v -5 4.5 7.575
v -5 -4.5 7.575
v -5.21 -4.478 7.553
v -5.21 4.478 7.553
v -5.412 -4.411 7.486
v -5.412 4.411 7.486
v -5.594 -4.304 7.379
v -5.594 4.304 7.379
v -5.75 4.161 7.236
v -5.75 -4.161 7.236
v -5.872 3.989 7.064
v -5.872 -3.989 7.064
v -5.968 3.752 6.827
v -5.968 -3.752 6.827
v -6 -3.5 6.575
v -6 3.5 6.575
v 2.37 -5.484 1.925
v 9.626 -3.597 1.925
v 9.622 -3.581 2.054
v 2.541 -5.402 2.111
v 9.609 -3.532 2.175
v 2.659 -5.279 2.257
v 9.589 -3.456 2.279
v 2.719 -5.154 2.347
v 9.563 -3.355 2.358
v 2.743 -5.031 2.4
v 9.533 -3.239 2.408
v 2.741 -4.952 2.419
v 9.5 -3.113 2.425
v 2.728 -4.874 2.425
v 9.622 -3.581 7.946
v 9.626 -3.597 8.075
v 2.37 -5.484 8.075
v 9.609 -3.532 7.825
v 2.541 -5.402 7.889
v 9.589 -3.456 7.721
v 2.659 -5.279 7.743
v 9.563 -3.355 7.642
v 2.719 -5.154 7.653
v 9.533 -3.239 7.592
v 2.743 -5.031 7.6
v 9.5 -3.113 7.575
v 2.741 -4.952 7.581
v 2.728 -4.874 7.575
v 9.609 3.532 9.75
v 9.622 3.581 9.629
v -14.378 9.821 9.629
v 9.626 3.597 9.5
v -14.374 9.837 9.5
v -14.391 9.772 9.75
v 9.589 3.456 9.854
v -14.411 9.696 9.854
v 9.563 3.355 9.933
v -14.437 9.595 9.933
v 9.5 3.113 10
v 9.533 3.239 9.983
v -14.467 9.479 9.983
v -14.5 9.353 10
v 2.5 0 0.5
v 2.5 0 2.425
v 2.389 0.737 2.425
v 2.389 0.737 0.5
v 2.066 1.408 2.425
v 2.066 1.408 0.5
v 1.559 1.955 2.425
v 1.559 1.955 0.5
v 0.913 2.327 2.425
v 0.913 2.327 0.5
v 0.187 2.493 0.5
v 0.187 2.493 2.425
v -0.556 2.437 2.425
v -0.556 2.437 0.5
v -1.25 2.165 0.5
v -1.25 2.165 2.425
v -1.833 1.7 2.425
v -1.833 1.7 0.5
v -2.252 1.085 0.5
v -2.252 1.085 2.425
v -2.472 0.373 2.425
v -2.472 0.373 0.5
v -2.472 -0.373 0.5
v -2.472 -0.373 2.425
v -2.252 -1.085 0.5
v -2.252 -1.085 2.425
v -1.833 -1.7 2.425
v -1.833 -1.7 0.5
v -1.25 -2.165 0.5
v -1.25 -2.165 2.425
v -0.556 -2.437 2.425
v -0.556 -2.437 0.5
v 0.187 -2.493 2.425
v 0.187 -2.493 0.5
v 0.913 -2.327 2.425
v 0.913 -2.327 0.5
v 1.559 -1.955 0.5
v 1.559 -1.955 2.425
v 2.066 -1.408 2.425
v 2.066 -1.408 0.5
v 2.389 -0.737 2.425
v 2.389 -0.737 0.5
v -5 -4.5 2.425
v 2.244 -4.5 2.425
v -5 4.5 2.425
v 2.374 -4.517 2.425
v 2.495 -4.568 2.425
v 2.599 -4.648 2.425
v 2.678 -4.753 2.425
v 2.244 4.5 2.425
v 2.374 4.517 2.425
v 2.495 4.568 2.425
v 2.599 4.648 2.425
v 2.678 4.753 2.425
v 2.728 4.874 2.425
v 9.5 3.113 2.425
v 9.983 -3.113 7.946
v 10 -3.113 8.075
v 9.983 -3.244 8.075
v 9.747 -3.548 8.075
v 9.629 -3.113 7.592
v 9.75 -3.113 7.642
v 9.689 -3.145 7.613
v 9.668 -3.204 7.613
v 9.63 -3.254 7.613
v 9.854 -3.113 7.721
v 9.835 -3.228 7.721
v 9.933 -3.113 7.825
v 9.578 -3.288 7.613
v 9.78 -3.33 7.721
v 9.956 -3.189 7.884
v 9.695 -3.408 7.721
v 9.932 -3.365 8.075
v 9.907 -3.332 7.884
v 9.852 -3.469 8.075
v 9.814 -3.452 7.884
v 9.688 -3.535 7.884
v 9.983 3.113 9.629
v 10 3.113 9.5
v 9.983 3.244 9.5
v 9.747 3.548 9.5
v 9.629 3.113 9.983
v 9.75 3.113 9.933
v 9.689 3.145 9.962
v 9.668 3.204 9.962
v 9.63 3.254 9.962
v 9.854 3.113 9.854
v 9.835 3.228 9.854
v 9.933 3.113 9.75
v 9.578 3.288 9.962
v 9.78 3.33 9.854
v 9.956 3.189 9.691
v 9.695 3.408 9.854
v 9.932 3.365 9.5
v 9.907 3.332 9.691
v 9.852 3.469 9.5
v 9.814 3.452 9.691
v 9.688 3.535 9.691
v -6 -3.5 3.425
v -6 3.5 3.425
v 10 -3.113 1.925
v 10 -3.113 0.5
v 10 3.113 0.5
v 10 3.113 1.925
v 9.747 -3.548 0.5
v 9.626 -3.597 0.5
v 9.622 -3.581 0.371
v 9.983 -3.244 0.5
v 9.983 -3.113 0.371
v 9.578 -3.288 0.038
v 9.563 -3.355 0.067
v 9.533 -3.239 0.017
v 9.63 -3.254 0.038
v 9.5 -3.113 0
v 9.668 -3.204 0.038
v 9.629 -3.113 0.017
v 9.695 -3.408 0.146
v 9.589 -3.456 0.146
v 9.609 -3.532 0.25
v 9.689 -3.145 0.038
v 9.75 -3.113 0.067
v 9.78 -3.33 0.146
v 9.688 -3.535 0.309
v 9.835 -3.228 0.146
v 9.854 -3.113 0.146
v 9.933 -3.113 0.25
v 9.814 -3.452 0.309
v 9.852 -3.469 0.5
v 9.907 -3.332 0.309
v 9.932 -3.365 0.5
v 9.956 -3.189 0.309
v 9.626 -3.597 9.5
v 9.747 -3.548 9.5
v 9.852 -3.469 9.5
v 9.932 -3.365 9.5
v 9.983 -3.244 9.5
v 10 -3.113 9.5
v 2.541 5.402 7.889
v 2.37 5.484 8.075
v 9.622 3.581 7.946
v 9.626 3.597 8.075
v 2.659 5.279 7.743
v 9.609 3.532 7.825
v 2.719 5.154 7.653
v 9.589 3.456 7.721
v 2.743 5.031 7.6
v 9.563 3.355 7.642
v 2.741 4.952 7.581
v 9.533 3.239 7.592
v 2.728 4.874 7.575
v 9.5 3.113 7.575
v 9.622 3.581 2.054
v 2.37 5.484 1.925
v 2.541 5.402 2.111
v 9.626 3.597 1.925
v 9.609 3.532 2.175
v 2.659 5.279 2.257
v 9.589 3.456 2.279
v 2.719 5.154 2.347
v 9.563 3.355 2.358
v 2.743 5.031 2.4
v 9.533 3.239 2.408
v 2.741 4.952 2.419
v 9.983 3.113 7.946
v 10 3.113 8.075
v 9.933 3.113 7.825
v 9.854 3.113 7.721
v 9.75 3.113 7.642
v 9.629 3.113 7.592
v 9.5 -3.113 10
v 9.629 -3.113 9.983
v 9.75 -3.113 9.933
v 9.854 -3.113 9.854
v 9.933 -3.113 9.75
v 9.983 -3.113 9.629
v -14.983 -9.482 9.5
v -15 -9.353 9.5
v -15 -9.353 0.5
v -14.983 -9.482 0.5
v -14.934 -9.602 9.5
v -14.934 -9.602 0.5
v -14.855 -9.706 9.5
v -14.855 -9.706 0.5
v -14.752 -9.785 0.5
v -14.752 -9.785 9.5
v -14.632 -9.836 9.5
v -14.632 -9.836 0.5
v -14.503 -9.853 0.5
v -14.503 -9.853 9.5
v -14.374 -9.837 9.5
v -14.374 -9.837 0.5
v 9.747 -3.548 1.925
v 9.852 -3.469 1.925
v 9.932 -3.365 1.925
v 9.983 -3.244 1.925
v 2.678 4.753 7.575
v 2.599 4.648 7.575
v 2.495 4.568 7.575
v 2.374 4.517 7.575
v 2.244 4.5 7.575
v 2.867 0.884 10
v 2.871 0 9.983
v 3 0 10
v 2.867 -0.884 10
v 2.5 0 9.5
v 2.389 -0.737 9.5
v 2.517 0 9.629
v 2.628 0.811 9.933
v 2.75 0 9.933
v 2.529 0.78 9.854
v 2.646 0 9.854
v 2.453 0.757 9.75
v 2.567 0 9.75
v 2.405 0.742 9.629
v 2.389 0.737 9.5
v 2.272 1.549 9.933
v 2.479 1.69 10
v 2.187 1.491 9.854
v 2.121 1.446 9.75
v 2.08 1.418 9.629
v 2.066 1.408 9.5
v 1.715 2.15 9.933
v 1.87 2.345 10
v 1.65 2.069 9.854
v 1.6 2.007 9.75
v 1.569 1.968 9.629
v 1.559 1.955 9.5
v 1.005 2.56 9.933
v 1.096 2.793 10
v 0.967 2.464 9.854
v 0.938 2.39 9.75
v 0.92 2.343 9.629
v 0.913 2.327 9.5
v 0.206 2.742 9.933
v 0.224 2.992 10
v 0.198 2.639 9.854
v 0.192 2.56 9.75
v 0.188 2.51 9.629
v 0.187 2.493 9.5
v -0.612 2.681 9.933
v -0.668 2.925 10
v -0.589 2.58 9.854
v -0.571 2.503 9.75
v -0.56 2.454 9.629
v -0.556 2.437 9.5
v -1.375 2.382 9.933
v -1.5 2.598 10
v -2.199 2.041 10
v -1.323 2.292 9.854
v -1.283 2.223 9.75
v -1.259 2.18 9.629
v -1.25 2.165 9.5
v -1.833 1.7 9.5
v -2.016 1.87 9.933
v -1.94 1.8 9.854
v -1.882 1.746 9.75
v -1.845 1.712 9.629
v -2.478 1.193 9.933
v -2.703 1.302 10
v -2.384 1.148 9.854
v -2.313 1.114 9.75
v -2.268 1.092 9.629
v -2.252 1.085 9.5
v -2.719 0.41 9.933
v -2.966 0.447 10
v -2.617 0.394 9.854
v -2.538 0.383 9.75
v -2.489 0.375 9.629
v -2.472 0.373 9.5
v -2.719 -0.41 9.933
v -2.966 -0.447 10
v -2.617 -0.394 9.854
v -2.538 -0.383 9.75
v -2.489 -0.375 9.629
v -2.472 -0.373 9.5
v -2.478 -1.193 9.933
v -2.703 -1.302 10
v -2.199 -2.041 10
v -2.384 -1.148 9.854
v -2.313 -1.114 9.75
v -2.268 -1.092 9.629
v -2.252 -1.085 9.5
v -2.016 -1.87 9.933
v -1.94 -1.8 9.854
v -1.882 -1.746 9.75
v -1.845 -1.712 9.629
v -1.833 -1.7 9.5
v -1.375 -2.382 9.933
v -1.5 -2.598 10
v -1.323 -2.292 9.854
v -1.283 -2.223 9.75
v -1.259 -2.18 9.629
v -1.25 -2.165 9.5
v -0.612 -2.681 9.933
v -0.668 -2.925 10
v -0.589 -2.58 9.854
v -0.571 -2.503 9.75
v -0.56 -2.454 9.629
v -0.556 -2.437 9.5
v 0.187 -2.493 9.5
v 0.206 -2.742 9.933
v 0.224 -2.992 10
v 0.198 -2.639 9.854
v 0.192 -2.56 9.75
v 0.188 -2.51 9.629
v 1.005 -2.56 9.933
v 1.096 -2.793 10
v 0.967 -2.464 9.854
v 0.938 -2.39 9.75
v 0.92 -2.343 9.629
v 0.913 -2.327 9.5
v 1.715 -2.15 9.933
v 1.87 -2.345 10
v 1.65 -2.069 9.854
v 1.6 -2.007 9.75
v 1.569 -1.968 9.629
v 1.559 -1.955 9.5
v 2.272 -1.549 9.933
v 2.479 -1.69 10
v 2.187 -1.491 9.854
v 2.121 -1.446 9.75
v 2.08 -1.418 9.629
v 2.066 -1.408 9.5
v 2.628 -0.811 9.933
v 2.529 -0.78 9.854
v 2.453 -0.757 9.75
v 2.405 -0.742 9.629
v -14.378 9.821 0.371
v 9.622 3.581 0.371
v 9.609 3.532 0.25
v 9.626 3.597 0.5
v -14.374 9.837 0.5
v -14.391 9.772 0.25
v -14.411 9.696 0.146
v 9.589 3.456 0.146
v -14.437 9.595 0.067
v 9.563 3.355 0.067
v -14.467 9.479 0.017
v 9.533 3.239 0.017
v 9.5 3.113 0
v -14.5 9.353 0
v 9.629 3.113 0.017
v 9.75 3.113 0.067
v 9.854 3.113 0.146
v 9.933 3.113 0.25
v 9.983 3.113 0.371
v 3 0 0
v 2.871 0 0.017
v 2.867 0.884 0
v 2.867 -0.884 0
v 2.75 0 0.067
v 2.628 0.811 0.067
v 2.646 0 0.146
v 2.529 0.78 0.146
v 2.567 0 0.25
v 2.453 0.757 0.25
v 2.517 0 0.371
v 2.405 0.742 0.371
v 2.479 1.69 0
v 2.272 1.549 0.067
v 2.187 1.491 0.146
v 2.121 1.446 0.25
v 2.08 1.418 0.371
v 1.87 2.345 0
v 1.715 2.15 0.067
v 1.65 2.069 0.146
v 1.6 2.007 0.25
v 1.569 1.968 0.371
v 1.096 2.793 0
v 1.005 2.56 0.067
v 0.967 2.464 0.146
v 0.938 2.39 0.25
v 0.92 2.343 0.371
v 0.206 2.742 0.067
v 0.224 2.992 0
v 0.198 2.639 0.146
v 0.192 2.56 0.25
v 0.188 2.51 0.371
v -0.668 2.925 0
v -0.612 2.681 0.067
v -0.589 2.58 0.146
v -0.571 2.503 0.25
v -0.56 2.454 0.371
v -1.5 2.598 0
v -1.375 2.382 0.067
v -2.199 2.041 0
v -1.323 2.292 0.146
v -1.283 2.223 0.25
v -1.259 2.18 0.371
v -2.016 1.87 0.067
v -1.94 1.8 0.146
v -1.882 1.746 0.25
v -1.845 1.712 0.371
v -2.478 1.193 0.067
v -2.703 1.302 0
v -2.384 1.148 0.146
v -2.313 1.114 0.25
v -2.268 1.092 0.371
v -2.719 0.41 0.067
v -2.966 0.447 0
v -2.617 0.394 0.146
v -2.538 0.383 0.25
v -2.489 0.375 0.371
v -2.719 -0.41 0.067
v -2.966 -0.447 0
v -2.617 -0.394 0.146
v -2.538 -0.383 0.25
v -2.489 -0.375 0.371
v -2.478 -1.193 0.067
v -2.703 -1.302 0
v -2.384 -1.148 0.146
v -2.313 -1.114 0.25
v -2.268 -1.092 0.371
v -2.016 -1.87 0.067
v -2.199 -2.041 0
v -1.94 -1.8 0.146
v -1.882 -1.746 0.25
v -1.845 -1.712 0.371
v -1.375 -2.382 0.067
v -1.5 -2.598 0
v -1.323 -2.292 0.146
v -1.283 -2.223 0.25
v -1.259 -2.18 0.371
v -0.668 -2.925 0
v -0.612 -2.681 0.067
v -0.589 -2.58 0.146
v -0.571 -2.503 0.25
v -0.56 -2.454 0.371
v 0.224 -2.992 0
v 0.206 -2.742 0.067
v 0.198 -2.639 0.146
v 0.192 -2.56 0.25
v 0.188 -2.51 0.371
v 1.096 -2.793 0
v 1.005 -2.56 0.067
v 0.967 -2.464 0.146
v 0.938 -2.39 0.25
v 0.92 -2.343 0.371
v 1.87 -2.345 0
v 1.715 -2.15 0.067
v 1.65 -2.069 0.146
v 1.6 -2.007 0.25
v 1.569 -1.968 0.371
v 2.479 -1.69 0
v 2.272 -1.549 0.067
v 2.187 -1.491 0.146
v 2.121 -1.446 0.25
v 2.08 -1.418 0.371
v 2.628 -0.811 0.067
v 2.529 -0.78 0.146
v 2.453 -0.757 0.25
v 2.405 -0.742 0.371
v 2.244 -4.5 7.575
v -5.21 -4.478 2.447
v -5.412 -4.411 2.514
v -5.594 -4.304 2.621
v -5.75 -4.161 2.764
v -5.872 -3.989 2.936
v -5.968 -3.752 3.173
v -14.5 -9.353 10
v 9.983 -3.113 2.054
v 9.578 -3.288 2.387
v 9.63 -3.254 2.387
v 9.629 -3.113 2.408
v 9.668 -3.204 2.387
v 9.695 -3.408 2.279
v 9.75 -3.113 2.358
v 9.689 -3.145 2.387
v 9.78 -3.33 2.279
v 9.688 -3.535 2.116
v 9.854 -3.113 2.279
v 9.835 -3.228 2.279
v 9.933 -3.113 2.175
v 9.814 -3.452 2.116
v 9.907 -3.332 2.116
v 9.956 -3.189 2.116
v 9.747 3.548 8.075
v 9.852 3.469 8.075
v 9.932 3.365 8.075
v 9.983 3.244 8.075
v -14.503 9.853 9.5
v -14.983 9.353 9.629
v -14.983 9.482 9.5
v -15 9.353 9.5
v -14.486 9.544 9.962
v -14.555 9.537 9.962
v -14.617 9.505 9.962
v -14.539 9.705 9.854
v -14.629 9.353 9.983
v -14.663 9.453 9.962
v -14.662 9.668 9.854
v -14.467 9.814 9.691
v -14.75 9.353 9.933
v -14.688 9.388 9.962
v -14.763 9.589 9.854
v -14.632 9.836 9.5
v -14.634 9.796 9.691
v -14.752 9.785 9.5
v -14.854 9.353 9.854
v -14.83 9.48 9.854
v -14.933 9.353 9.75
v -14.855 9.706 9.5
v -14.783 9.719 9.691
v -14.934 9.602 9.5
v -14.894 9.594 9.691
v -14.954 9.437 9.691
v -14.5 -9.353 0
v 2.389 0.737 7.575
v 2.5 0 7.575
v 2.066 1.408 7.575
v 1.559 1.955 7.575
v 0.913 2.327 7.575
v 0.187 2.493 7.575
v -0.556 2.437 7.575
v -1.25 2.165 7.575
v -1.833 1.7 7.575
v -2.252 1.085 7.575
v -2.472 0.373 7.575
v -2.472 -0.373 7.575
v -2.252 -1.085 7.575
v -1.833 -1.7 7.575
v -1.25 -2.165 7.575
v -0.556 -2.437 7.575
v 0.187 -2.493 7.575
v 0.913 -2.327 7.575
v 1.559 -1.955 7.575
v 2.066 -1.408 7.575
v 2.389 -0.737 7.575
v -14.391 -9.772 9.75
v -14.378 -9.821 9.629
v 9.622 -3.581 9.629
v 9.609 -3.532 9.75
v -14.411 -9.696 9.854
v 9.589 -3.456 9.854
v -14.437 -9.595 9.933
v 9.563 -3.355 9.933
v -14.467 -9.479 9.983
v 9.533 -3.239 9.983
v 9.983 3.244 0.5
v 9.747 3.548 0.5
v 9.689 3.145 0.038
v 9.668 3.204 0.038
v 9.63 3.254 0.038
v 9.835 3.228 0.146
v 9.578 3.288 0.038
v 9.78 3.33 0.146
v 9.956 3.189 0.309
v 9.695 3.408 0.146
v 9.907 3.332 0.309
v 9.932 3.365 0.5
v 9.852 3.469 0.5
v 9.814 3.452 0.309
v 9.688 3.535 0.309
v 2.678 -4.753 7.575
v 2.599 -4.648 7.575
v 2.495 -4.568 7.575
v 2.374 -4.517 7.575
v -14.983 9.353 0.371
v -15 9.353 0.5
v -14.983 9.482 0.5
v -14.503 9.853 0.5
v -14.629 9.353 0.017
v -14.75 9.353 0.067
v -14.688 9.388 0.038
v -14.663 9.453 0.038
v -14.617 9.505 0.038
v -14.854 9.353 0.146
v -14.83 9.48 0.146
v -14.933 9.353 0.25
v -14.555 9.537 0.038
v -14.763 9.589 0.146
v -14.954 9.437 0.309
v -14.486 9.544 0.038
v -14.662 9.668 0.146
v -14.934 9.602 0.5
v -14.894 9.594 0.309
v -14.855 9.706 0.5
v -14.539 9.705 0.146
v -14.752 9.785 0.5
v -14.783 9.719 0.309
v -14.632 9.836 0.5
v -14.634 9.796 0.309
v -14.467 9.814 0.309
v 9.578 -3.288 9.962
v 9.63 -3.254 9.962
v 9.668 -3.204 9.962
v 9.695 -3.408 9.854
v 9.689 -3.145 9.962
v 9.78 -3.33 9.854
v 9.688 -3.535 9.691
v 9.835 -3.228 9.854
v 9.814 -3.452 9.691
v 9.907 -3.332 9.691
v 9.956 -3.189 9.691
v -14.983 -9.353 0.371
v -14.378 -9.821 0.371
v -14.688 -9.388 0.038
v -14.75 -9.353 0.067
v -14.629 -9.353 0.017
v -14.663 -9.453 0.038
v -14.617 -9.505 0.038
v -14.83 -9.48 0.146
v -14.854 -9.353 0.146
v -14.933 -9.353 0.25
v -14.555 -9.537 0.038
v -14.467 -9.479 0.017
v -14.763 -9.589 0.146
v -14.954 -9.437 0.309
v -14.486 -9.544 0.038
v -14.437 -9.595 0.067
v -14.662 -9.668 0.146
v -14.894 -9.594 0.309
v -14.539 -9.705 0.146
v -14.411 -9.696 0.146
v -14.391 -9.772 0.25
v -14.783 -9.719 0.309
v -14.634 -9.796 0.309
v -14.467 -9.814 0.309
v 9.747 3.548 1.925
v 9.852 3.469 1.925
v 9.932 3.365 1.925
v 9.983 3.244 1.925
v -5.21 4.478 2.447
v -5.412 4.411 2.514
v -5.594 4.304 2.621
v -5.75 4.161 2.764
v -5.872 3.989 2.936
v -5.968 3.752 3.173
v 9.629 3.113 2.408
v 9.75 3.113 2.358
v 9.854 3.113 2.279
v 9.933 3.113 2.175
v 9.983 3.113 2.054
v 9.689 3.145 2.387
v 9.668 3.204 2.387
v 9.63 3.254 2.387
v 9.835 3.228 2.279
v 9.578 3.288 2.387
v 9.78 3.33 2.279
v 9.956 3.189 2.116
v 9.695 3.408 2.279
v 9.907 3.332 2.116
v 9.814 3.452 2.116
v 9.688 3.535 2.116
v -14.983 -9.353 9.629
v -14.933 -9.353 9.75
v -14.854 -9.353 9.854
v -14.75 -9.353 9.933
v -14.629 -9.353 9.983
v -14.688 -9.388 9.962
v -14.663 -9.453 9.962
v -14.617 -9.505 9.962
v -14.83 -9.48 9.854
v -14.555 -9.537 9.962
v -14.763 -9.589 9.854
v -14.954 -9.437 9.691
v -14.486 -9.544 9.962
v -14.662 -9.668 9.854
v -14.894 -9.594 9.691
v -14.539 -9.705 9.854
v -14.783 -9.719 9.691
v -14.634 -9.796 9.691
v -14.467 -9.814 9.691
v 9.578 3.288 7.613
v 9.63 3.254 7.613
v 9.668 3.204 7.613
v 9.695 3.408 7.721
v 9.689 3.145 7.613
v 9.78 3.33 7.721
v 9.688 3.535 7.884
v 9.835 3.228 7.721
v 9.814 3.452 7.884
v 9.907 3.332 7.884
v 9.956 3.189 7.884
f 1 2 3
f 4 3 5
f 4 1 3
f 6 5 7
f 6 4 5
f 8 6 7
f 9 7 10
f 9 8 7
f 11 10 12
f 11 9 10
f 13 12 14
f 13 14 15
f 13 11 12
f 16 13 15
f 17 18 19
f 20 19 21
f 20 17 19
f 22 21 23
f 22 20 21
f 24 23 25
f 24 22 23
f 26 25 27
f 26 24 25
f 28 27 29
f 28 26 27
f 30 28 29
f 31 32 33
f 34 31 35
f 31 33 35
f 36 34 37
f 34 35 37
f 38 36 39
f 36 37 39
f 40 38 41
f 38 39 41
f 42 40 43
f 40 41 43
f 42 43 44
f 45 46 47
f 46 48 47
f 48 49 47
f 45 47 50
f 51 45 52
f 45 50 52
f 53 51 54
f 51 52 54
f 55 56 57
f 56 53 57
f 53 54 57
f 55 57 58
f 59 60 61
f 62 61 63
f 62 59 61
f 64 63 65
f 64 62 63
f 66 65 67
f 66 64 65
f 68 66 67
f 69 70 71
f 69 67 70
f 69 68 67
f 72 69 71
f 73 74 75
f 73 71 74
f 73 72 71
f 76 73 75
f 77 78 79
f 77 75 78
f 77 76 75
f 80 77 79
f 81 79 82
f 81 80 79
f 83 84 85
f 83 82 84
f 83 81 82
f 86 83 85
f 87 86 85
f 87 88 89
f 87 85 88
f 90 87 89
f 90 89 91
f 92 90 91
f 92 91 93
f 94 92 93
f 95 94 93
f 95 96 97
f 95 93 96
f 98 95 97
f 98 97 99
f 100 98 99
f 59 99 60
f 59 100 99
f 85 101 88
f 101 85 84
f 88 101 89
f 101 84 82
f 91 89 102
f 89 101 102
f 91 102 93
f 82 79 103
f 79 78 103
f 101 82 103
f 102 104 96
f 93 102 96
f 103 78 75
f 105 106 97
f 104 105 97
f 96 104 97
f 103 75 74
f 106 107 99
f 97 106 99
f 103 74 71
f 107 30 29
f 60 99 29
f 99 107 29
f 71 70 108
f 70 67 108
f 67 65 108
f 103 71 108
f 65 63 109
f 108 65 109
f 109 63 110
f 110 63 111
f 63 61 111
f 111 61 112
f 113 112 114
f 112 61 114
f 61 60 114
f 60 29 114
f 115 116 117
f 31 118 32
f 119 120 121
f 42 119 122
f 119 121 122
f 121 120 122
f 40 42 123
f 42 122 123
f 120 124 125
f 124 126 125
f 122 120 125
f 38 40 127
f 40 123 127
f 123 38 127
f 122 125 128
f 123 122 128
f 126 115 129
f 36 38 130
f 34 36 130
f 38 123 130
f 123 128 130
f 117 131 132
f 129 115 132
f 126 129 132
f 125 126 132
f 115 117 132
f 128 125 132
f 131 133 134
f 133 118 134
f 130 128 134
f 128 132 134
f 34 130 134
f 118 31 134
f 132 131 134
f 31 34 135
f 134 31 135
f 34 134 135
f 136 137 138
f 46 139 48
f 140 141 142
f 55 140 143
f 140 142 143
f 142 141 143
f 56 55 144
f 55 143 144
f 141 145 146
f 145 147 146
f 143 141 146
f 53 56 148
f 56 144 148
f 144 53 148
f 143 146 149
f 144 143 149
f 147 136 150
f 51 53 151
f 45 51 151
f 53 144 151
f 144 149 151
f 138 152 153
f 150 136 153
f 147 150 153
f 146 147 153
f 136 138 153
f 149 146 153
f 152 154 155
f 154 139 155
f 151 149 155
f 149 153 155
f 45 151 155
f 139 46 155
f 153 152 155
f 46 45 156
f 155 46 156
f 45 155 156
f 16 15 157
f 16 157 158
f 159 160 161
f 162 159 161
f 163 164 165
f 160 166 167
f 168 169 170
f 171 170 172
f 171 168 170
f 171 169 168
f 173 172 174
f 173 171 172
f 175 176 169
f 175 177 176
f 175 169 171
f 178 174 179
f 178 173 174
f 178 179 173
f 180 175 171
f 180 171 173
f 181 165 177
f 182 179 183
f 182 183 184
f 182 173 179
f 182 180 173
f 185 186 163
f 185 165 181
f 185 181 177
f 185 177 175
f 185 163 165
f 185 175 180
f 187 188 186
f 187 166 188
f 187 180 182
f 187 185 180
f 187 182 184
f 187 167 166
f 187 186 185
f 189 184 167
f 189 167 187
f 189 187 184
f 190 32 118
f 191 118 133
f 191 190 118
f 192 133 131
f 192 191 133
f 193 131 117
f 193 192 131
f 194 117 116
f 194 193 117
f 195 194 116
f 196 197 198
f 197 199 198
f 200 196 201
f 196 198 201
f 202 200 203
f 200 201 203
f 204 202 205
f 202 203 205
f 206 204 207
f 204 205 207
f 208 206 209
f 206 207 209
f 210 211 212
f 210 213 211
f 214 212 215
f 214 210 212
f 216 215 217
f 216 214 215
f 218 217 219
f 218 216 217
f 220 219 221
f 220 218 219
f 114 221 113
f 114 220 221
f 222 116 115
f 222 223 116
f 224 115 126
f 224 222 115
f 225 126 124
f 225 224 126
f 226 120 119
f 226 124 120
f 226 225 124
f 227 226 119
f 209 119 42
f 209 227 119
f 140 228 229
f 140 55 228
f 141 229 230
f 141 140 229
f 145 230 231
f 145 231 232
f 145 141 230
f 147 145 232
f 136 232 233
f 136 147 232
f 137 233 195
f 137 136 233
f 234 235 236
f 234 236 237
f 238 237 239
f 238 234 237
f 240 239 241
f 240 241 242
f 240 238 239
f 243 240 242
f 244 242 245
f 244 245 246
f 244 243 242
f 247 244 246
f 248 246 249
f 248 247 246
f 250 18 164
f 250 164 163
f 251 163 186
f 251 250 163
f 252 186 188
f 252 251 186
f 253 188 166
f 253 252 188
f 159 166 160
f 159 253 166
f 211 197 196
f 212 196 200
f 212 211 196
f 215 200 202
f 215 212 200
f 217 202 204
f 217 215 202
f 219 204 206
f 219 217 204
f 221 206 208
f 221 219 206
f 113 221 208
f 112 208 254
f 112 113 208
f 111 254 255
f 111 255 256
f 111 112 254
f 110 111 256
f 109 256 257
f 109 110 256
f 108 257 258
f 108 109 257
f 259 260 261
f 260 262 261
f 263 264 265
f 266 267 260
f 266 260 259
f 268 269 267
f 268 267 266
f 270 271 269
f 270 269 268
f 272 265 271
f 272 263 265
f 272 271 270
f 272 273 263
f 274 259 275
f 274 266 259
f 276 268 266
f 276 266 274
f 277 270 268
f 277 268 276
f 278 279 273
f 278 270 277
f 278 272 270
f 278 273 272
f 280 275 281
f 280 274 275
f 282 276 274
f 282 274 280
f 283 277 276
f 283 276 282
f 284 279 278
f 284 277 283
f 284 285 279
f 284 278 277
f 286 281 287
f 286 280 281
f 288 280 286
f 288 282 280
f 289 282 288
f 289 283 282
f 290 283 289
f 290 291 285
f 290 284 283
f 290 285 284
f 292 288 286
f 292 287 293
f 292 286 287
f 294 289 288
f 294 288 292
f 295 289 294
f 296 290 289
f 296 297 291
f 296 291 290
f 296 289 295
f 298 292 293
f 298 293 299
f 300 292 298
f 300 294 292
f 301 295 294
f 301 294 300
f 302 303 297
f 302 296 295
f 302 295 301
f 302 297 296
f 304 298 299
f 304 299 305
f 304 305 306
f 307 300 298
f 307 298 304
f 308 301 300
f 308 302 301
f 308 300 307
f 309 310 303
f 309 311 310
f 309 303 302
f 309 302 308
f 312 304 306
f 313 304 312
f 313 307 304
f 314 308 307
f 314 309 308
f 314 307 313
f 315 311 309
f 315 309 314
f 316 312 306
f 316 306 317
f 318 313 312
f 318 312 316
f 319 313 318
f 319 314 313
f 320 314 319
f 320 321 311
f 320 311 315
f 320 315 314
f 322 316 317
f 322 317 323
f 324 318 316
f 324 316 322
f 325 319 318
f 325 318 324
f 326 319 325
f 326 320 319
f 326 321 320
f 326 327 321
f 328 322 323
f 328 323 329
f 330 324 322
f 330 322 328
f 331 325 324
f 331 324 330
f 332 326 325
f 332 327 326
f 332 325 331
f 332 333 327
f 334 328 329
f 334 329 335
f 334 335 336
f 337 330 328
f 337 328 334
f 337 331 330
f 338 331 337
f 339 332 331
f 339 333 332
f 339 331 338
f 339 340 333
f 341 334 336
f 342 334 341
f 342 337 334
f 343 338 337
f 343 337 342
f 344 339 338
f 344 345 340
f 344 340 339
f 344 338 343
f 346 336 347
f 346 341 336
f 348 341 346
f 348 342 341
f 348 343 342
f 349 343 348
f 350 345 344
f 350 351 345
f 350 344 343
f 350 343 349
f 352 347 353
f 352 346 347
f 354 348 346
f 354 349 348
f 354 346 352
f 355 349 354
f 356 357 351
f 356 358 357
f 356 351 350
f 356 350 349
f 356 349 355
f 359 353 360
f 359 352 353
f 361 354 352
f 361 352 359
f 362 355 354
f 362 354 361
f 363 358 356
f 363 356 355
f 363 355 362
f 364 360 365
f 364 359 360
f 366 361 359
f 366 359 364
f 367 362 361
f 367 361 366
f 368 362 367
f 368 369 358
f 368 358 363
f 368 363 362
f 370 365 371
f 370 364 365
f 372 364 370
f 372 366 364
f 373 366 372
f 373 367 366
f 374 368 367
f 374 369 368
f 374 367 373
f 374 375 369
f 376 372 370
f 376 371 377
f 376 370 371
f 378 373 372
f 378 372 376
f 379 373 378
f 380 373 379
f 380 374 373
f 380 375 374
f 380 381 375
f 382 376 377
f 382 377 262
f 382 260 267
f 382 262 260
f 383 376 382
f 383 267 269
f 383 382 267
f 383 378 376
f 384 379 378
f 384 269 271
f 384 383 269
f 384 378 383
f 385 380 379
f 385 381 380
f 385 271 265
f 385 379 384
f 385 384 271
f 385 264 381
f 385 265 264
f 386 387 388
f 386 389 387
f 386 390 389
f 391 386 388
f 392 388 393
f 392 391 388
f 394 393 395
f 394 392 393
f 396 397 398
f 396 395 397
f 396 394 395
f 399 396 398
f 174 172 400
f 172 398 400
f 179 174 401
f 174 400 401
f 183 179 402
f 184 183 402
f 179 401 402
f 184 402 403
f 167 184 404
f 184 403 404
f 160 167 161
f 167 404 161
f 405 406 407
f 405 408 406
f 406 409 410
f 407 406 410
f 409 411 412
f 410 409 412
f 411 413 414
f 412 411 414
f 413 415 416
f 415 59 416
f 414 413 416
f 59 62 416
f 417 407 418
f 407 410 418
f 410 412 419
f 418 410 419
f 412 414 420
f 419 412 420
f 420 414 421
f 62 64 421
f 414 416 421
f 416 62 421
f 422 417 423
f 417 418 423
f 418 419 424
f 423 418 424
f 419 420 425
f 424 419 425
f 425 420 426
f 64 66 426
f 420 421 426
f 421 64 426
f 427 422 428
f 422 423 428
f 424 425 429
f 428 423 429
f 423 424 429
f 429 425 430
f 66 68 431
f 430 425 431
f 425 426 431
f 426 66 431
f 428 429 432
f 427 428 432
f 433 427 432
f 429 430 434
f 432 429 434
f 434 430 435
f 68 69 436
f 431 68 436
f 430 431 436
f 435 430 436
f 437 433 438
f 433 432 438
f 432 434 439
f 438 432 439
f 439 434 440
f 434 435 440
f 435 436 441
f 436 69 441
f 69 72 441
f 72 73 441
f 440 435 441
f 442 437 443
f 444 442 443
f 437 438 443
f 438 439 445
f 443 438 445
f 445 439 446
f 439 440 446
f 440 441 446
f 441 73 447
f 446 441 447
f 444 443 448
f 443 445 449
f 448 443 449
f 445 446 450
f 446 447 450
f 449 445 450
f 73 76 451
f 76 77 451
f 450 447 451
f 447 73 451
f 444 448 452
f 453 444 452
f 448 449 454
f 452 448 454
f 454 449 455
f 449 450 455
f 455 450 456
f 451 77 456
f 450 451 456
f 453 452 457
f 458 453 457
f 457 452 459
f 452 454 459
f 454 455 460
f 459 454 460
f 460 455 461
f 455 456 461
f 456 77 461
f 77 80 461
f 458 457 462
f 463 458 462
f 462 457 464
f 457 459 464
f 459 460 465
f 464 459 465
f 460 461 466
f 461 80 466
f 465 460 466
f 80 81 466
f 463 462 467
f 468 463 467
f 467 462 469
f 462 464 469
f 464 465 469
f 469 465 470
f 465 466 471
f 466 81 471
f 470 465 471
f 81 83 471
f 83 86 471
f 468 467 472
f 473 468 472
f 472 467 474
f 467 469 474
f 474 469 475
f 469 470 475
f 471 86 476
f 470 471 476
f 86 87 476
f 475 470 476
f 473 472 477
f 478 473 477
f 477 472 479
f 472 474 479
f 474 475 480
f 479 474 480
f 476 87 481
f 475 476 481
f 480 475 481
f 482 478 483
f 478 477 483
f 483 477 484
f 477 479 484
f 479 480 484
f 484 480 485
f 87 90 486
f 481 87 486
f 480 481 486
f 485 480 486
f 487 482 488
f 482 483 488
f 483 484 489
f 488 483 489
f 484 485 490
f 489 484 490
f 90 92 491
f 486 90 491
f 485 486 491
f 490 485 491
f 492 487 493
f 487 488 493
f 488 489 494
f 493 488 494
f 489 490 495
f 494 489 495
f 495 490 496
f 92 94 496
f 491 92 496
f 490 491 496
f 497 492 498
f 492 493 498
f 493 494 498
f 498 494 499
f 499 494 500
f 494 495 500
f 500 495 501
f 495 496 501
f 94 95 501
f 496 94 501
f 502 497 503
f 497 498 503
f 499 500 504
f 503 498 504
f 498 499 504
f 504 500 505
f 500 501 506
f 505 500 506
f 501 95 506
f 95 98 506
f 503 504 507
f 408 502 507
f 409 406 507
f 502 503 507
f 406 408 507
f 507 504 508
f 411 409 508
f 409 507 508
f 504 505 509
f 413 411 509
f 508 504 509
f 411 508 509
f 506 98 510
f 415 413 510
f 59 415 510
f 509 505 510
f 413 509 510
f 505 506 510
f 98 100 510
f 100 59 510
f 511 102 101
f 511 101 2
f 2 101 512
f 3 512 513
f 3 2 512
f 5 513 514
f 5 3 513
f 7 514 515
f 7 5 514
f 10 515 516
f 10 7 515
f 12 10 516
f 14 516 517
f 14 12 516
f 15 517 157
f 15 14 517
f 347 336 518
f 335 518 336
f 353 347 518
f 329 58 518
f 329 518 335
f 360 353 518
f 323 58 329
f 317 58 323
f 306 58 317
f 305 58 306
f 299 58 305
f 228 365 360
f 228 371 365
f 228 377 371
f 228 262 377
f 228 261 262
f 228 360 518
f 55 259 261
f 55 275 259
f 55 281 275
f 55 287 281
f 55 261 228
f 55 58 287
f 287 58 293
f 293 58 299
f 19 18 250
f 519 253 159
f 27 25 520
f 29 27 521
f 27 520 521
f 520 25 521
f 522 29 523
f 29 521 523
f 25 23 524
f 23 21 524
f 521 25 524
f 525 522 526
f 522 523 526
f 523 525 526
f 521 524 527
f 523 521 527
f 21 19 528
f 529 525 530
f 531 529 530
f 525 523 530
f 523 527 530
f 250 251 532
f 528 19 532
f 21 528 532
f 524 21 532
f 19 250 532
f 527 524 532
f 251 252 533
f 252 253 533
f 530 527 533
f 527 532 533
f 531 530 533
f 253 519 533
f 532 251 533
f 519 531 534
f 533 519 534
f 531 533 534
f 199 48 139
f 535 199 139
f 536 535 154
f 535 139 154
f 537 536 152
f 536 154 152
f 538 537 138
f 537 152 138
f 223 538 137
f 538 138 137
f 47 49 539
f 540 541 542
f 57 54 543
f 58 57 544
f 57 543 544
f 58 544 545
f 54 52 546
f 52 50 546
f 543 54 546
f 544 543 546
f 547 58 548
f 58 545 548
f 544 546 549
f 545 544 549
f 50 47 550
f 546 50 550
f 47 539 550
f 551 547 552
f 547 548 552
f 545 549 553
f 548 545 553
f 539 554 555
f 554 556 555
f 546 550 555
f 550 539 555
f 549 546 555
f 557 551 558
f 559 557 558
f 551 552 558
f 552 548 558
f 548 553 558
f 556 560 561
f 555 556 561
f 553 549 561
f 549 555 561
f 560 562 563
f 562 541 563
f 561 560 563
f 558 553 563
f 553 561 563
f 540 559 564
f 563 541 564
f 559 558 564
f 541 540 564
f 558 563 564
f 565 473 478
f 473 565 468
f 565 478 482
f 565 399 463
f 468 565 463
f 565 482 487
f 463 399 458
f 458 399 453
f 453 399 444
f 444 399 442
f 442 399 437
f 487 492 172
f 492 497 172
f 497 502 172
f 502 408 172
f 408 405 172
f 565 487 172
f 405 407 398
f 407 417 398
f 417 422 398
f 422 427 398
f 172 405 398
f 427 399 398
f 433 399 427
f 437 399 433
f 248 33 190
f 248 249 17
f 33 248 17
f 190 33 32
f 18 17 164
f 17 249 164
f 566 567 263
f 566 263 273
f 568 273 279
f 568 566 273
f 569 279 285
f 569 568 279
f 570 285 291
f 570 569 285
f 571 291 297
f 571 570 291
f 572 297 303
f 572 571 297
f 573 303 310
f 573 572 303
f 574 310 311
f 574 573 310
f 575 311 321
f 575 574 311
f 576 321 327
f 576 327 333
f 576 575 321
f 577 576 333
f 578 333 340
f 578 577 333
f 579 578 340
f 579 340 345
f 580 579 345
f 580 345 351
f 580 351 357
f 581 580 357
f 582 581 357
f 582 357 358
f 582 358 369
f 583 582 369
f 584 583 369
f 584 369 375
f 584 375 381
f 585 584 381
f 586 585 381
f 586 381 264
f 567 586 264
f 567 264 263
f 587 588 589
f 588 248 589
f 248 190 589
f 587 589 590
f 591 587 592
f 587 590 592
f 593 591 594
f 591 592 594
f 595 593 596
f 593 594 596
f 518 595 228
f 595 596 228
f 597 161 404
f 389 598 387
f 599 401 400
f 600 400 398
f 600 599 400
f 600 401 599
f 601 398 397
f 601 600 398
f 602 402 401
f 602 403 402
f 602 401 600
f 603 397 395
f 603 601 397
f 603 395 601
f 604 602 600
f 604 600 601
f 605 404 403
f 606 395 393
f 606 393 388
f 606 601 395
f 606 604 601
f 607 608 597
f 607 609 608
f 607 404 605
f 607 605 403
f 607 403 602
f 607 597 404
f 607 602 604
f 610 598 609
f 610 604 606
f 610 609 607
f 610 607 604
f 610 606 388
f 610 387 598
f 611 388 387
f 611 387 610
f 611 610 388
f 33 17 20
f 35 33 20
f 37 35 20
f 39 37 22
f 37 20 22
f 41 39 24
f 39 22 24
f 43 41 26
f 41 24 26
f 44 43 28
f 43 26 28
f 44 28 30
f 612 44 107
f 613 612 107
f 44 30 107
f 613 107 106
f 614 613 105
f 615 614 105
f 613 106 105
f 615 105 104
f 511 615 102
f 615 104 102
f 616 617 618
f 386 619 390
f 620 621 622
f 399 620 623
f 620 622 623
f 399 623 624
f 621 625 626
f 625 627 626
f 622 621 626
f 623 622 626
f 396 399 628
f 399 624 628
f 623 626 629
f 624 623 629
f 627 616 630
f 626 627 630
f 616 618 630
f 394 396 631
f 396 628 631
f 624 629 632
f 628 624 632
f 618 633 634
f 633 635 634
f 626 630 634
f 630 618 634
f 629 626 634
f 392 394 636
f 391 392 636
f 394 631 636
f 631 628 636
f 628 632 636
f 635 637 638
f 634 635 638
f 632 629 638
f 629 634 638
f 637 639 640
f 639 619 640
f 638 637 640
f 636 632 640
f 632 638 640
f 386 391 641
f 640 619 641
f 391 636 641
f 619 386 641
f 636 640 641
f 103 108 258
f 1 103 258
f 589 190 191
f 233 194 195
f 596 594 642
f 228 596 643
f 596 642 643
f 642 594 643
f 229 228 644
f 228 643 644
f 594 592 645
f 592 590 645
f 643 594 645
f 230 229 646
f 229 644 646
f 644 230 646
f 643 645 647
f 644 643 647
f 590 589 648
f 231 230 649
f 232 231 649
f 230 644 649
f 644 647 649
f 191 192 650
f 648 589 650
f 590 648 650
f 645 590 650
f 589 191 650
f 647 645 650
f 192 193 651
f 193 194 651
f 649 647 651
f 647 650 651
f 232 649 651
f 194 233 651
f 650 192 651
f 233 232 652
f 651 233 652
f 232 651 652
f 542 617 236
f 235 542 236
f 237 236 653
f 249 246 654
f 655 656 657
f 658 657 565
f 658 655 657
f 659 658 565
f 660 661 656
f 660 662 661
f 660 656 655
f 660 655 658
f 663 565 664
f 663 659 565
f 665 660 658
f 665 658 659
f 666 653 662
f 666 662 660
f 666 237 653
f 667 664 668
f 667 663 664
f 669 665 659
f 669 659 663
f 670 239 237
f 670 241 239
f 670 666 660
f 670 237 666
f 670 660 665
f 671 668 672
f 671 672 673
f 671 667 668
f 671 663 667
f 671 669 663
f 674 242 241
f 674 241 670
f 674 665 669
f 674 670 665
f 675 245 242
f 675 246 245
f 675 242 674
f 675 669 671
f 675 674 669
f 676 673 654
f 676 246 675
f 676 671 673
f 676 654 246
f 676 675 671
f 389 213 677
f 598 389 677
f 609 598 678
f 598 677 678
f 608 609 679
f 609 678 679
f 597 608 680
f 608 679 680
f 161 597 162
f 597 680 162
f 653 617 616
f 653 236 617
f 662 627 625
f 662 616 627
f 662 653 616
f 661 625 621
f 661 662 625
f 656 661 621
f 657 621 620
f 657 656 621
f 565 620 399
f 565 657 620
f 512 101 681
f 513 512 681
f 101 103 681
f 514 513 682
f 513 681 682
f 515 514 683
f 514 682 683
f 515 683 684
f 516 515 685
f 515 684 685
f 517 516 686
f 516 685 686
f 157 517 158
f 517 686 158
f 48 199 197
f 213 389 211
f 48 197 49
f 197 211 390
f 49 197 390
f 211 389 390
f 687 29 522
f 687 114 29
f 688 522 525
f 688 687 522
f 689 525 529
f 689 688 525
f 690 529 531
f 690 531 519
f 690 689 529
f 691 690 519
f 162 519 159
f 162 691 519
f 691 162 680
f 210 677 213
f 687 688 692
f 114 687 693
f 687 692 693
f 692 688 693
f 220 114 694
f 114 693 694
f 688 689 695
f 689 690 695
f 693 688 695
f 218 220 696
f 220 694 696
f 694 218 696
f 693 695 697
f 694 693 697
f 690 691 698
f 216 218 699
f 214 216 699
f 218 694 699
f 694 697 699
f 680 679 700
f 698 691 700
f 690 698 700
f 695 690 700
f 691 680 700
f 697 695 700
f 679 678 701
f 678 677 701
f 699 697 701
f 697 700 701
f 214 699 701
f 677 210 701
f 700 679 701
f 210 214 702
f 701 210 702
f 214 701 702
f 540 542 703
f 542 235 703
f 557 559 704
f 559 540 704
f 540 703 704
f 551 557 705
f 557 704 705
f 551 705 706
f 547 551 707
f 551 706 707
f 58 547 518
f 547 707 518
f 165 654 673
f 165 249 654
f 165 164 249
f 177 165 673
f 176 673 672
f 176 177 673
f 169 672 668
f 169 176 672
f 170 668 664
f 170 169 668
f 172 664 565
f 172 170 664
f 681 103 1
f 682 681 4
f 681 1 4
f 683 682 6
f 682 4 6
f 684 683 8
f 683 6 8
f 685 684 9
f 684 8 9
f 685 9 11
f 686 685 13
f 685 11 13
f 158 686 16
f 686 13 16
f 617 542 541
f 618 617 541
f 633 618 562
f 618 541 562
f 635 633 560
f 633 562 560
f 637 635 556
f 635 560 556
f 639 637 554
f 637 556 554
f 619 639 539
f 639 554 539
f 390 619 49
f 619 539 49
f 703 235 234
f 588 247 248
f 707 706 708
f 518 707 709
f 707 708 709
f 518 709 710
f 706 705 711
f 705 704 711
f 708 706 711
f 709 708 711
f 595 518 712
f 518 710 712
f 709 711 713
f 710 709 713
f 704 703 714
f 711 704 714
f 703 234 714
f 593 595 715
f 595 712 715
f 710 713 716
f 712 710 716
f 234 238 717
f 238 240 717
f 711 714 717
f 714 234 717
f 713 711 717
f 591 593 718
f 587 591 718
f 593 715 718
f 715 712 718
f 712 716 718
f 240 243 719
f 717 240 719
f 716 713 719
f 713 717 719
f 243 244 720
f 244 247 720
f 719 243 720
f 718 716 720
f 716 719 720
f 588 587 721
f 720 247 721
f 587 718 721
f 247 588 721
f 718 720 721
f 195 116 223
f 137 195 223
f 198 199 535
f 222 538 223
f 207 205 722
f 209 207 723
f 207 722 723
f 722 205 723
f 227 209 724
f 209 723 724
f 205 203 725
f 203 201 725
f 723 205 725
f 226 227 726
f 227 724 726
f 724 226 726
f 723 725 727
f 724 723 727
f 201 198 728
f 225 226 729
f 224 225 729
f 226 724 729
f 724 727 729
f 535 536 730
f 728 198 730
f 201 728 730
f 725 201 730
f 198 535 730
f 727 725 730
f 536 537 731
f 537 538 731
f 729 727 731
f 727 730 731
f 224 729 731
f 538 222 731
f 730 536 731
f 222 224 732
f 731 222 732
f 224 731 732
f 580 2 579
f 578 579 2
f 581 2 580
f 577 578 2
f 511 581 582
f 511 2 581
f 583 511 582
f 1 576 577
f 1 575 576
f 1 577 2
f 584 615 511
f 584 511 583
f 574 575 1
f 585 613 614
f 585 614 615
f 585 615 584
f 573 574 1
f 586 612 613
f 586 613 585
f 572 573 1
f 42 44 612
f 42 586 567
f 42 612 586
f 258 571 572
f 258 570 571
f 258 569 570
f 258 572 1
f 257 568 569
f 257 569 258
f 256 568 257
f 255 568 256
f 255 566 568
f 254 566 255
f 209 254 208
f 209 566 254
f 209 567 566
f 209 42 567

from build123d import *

# Parameters (mm, degrees)
SKETCH_R     = 2.5
PAD_DEPTH    = 10
SKETCH001_W  = 9
SKETCH001_H  = 5.15
POCKET_DEPTH = 16
FILLET_R     = 0.5
FILLET001_R  = 1


with BuildPart() as part:
    # Sketch → Pad (new body)
    with BuildSketch(Plane.XY):
        Polygon((-15, 10), (-15, -10), (10, -3.5), (10, 3.5), align=None)
        Circle(SKETCH_R, mode=Mode.SUBTRACT)
    extrude(amount=PAD_DEPTH)

    # Sketch001 (on Face3 of Pad) → Pocket (cut)
    with BuildSketch(Plane.YZ.offset(10)):
        with Locations((0, 5)):
            Rectangle(SKETCH001_W, SKETCH001_H)
    extrude(amount=-POCKET_DEPTH, mode=Mode.SUBTRACT)

    # Fillet
    fillet_edges = [part.edges().sort_by_distance(p)[0] for p in [
        (-2.5, 6.75, 0),
        (-15, 10, 5),
        (-2.5, 6.75, 10),
        (10, 3.5, 8.7875),
        (8.076923, 4, 7.575),
        (6.153846, 4.5, 5),
        (8.076923, 4, 2.425),
        (10, 3.5, 1.2125),
        (-15, 0, 0),
        (-2.5, -6.75, 0),
        (10, 0, 0),
        (-2.5, 0, 0),
        (-15, -10, 5),
        (-15, 0, 10),
        (10, -3.5, 1.2125),
        (8.076923, -4, 2.425),
        (6.153846, -4.5, 5),
        (8.076923, -4, 7.575),
        (10, -3.5, 8.7875),
        (-2.5, -6.75, 10),
        (10, 0, 10),
        (-2.5, 0, 10),
        (10, 0, 7.575),
        (10, 0, 2.425),
    ]]
    fillet(fillet_edges, radius=FILLET_R)

    # Fillet001
    fillet001_edges = [part.edges().sort_by_distance(p)[0] for p in [
        (-6, 0, 7.575),
        (-6, 4.5, 5),
        (-6, 0, 2.425),
        (-6, -4.5, 5),
    ]]
    fillet(fillet001_edges, radius=FILLET001_R)


solid = part.part
